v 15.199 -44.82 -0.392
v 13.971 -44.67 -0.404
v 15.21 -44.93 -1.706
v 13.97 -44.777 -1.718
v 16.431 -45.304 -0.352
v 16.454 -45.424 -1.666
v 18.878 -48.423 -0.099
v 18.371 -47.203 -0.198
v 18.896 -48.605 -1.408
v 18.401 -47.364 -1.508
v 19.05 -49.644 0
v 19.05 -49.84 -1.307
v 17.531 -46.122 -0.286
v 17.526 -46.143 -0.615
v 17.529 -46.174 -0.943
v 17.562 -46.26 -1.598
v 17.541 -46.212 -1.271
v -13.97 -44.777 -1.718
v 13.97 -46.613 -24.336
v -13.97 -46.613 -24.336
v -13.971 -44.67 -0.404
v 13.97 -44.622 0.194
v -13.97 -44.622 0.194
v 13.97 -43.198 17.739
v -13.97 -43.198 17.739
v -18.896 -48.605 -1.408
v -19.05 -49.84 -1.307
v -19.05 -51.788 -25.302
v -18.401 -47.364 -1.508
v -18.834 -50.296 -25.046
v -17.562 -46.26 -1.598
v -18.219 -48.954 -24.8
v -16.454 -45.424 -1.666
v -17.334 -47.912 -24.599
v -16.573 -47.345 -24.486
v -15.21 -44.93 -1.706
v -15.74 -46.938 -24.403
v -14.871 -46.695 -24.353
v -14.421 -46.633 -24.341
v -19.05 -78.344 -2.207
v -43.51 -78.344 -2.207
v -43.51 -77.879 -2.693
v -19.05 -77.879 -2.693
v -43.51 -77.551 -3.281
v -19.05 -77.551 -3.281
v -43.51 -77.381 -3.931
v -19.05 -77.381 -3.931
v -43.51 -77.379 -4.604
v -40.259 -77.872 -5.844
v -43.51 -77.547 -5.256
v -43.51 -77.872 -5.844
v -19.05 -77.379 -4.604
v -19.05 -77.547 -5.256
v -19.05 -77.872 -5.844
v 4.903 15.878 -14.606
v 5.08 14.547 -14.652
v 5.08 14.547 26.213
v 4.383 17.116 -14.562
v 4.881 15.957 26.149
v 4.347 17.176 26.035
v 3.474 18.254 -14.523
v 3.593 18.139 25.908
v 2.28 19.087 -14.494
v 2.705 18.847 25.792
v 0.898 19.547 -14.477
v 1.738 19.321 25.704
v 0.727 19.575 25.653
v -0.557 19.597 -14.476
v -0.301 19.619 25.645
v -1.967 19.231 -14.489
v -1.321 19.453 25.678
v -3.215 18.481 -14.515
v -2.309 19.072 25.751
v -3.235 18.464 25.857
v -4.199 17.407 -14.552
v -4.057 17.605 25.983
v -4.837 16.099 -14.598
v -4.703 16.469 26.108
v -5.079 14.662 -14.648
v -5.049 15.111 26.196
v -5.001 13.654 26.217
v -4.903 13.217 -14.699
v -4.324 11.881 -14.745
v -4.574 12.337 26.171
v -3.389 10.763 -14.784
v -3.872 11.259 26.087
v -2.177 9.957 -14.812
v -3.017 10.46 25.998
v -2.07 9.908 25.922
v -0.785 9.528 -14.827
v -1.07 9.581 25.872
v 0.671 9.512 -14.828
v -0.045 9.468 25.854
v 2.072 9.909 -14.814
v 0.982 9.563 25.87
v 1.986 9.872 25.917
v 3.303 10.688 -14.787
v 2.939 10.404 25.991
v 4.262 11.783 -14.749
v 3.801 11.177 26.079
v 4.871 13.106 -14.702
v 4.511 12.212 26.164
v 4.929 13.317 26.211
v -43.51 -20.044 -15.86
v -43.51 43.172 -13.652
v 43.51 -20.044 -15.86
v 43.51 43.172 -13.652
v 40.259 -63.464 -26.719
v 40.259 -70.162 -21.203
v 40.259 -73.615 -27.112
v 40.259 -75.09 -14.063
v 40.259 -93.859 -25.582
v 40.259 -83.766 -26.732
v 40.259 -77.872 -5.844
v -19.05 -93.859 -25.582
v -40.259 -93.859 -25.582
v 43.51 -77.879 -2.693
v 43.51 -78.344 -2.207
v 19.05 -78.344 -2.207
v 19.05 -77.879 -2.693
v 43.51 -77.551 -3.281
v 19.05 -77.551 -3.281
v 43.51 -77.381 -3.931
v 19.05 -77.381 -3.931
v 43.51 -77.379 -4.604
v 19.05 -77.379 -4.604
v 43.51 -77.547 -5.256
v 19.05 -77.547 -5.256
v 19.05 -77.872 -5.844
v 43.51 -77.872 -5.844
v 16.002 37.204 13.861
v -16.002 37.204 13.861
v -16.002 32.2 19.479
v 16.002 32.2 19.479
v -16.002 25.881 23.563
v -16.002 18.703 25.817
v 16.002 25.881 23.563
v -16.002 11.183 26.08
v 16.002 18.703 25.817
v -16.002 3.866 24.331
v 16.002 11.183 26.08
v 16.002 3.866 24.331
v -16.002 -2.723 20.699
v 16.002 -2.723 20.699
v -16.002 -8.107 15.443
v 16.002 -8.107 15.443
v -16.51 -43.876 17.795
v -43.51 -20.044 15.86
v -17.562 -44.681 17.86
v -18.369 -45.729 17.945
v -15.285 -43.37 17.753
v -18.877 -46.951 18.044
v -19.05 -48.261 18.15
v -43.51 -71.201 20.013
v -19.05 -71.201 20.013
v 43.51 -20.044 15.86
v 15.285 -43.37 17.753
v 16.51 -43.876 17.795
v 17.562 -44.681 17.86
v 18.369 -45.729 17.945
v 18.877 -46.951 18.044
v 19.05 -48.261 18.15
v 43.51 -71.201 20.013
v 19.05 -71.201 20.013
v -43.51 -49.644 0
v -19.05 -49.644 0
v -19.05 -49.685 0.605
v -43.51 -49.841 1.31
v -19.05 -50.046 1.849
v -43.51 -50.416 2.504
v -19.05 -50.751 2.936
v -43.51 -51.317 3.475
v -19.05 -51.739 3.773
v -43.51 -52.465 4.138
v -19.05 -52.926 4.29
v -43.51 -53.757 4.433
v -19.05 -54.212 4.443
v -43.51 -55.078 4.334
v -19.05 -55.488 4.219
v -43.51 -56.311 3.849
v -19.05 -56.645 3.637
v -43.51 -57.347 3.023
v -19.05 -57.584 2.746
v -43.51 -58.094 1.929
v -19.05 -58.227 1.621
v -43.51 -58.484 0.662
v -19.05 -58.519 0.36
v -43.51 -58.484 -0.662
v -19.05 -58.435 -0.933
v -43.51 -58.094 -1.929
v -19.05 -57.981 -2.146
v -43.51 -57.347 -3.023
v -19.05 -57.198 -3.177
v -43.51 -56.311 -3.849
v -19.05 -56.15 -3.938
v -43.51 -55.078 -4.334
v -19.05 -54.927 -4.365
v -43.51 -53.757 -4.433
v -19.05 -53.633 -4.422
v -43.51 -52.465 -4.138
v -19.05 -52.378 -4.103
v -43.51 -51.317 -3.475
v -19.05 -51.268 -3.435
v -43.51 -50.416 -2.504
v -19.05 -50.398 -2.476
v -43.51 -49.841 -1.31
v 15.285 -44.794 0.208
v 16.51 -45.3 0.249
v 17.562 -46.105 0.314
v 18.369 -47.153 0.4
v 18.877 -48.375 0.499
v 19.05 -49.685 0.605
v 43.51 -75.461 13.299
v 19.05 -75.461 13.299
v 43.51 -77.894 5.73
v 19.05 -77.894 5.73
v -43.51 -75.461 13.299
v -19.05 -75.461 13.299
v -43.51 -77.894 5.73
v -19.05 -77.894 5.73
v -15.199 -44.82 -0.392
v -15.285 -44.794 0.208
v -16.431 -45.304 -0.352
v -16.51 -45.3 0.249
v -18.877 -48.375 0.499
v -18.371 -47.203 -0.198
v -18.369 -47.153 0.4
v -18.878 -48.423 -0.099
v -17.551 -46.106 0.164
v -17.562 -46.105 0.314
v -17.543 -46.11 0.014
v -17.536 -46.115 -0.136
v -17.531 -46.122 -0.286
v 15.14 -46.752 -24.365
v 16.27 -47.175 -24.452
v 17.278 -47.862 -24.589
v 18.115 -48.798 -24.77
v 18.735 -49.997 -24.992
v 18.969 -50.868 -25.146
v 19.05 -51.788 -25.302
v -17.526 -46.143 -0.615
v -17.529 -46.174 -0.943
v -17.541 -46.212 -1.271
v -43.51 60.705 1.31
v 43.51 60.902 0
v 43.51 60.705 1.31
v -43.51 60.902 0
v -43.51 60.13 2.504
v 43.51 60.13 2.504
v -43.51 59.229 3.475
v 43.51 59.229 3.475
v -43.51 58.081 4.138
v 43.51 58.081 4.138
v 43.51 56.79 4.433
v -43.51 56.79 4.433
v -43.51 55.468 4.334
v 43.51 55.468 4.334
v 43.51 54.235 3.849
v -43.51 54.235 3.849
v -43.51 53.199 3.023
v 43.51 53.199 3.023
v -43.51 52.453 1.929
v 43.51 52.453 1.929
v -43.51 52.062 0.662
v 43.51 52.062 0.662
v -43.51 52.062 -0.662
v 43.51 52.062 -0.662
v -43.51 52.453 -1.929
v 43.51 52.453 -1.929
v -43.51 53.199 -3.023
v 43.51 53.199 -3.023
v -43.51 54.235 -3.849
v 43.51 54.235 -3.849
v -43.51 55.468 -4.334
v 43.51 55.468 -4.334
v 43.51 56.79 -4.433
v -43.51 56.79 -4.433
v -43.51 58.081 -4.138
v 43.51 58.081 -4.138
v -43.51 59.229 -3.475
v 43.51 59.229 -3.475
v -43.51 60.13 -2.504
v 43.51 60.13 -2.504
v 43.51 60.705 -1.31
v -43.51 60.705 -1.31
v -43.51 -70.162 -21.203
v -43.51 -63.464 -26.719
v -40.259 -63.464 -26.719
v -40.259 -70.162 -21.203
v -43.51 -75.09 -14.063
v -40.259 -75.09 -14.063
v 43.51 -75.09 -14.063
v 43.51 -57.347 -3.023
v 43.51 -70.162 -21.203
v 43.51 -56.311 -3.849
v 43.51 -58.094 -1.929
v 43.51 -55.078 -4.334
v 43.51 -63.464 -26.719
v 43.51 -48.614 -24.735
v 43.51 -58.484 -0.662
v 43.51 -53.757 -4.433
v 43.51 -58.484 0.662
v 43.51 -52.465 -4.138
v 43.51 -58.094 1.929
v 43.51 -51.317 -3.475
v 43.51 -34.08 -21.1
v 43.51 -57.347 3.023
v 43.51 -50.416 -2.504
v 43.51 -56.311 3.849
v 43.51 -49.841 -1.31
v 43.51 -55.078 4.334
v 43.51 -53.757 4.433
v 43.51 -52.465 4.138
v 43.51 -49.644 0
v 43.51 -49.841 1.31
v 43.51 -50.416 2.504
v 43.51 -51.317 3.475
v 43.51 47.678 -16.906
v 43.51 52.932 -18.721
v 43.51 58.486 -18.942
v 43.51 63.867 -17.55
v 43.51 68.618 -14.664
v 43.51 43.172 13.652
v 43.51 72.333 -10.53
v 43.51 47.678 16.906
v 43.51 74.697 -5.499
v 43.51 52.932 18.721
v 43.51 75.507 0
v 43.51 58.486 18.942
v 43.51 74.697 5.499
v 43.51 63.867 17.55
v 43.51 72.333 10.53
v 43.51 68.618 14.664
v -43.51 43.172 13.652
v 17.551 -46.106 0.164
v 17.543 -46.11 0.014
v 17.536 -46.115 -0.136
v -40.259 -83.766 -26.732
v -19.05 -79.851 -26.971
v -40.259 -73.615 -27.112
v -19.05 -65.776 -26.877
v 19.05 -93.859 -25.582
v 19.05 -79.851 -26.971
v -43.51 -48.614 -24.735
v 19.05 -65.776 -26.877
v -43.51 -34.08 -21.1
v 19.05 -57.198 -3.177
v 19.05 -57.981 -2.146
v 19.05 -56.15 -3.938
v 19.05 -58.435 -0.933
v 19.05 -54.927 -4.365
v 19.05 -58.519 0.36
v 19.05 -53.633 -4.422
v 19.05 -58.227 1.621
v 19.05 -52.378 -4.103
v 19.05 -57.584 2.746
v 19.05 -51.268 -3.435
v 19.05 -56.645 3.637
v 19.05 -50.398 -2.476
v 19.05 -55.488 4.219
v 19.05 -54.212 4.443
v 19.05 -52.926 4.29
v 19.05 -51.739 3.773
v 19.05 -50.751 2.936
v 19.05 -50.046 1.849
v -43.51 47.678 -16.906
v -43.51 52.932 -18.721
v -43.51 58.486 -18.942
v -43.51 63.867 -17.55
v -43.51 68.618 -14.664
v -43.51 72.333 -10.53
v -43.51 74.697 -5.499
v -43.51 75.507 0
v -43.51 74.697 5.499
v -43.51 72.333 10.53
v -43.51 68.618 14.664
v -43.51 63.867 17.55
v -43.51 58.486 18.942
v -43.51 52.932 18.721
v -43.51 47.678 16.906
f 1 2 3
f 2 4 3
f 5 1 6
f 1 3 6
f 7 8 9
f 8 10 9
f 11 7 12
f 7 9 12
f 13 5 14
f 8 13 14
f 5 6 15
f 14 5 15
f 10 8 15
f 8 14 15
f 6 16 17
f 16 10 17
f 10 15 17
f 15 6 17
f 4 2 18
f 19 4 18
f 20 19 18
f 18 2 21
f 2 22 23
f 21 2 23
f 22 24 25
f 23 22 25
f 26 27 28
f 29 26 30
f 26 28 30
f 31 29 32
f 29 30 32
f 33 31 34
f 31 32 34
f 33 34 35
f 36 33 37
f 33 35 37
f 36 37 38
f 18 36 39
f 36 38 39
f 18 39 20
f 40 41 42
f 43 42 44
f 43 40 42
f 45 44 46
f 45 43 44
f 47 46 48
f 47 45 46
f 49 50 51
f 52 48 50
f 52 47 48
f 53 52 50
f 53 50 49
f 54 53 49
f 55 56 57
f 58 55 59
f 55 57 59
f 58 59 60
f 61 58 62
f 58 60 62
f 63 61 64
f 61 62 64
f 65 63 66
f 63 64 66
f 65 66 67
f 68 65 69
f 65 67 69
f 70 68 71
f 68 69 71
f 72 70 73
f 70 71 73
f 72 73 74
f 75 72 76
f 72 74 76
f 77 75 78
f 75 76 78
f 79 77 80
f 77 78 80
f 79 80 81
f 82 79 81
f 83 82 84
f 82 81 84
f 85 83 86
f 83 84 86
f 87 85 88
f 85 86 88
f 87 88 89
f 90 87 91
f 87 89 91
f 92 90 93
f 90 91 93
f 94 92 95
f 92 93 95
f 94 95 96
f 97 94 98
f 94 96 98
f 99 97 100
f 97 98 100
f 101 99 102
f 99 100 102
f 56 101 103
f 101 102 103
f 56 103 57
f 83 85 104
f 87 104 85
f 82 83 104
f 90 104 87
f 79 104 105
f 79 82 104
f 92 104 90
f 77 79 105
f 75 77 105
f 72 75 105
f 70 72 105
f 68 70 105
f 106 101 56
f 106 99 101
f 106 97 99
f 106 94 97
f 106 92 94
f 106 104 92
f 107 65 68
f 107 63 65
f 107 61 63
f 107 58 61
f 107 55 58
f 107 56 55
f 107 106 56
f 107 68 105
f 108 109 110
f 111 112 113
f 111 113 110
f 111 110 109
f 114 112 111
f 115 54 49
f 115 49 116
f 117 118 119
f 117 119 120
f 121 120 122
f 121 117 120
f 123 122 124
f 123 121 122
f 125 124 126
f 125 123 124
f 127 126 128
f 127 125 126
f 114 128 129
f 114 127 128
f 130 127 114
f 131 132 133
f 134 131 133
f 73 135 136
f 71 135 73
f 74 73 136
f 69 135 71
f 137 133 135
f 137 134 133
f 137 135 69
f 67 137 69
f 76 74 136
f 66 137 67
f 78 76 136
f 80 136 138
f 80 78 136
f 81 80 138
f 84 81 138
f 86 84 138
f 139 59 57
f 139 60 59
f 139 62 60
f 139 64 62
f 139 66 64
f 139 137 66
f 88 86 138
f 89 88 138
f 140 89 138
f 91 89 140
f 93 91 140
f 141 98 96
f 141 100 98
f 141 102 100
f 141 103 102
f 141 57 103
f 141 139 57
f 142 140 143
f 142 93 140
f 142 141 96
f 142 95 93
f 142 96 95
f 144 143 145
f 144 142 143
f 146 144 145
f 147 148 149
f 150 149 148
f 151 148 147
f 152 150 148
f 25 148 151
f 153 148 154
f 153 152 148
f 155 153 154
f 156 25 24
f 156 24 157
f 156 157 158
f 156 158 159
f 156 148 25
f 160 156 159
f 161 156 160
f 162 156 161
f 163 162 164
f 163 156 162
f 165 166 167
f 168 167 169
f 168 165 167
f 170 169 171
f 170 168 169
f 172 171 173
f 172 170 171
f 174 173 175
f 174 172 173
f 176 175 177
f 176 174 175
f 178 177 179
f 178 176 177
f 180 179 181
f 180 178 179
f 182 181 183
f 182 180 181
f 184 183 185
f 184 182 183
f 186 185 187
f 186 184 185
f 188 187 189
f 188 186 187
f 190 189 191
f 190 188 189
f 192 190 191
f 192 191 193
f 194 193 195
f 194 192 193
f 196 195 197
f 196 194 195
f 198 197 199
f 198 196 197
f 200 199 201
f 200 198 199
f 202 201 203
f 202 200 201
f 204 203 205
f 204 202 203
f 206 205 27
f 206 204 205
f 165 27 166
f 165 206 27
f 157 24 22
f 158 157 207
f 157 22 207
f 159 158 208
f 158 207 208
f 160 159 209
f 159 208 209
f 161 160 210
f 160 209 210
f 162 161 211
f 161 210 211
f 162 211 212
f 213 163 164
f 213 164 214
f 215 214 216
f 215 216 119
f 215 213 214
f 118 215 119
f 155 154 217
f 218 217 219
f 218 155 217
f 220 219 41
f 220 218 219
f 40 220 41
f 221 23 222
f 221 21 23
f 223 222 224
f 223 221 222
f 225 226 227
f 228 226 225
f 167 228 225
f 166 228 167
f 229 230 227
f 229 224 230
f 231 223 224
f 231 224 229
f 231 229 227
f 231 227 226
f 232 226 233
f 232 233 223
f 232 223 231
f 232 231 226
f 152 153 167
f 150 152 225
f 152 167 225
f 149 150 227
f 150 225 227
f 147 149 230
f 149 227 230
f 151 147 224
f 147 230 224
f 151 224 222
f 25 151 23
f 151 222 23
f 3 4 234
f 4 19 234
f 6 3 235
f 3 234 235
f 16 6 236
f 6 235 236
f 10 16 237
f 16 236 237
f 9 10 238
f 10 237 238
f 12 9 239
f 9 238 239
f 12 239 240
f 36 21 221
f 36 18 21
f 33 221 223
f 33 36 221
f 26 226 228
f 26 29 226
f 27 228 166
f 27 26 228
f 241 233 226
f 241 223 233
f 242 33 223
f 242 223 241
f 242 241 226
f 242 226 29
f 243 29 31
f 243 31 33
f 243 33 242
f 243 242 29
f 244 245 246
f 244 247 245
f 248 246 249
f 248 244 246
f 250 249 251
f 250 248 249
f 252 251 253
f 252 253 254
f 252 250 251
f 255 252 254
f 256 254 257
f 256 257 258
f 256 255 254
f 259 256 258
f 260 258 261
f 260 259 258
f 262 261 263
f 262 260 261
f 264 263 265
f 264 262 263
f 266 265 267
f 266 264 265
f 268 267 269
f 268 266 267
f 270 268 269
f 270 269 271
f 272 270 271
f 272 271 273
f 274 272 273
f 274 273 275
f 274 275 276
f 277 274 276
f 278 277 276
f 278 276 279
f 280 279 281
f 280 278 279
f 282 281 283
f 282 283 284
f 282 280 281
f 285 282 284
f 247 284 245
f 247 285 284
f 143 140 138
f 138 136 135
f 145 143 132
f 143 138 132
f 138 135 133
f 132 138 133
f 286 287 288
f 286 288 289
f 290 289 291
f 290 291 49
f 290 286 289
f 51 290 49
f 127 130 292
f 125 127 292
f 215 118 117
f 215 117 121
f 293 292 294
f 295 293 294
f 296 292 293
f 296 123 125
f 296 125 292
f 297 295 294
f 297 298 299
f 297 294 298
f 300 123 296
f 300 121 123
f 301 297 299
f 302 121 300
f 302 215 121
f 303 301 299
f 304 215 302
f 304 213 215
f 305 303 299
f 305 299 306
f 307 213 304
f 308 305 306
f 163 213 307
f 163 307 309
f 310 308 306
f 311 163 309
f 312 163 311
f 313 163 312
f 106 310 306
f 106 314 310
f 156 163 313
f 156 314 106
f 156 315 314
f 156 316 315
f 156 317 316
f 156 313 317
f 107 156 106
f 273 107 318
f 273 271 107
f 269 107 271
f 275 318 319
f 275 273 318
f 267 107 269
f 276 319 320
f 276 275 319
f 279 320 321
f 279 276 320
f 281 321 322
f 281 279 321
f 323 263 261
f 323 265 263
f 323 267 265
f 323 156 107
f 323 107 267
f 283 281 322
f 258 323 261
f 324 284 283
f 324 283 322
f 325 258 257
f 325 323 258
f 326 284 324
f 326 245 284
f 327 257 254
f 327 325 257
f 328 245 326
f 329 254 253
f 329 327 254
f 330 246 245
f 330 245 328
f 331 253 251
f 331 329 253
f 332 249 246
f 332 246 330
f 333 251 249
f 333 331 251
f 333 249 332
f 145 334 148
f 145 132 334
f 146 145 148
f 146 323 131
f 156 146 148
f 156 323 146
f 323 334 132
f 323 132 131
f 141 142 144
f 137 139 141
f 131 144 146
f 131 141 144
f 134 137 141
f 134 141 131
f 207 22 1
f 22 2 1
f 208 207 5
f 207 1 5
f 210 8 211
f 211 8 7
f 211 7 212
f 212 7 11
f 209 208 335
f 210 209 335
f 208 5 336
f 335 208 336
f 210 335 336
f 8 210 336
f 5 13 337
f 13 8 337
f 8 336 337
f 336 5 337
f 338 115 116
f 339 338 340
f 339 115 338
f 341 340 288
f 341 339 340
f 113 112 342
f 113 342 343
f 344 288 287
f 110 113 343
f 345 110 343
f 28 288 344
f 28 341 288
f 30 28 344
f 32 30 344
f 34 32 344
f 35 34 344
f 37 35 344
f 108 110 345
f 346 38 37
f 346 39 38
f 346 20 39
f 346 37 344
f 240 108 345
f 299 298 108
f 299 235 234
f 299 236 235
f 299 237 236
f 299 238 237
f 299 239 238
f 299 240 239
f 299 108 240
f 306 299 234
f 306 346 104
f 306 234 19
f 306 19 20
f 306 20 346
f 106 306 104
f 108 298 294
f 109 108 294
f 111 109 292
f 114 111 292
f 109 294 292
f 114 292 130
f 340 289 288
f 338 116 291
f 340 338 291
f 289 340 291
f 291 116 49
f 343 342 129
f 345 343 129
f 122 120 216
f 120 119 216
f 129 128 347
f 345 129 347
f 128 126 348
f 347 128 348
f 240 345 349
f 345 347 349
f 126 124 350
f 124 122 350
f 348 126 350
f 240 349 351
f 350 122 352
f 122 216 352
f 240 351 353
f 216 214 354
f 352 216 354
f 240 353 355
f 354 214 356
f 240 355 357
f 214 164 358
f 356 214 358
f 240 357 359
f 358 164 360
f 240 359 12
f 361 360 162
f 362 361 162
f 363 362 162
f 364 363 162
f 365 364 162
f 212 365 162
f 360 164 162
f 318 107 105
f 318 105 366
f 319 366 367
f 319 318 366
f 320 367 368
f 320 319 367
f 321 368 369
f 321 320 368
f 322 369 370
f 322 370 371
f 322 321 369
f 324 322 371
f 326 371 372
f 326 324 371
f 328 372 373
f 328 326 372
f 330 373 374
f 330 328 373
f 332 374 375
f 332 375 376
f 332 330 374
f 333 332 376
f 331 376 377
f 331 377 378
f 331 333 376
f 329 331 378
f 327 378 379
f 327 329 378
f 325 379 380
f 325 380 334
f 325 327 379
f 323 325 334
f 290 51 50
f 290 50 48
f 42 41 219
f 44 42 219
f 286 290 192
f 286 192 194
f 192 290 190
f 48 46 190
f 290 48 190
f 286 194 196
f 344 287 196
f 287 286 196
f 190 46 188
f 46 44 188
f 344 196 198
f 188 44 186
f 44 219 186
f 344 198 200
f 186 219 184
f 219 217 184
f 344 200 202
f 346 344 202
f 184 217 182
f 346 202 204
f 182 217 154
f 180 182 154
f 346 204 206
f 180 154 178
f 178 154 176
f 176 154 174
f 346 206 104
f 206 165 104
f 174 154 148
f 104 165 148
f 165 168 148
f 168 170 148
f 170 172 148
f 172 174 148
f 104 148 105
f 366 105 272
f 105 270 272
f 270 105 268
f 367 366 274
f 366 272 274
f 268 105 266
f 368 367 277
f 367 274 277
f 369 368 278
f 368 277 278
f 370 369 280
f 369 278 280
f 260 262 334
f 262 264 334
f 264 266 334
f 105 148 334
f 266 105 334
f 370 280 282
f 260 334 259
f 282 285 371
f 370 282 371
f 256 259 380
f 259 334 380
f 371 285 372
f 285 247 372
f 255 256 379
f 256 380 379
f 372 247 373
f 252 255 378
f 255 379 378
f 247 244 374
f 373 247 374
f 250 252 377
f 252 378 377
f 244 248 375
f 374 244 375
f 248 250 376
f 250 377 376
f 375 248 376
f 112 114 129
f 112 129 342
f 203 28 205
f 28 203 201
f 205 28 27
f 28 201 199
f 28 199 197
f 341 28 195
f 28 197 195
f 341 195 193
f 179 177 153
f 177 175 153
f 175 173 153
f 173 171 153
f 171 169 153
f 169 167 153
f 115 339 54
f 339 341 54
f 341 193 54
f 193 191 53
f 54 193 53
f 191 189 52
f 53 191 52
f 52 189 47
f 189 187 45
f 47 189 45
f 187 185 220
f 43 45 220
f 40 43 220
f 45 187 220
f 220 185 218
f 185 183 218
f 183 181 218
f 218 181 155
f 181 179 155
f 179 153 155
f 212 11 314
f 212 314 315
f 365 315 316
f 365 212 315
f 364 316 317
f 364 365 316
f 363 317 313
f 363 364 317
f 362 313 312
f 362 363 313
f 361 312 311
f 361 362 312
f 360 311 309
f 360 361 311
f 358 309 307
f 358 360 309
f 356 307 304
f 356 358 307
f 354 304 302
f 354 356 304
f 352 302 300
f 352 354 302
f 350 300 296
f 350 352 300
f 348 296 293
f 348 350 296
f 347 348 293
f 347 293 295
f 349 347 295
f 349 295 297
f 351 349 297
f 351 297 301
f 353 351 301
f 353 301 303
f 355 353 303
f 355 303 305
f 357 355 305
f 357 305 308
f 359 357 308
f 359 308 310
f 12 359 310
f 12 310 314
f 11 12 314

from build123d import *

# Parameters (mm, degrees)
F0_R      = 4.445
F1_DEPTH  = 43.5102
F4_DEPTH  = 16.002
F5_R      = 5.08
F6_DEPTH  = 76.2
F8_DEPTH  = 3.2512
F10_DEPTH = 48.8043176288
F11_R     = 5.08


# Not quite as in the source:
# - a pattern or mirror of a feature is missing from the dataset's text; its kind, count and spacing are read off the source's solid


with BuildPart() as f1:
    # F0 (on Right) → F1 (new body, symmetric)
    with BuildSketch(Plane.YZ):
        with BuildLine():
            Line((-20.0435682294, -15.8600244388), (43.1716607283, -13.6525))
            ThreePointArc((43.1716607283, -13.6525), (75.5074329584, 0), (43.1716607283, 13.6525))
            Line((43.1716607283, 13.6525), (-20.0435682294, 15.8600244388))
            ThreePointArc((-20.0435682294, 15.8600244388), (-15.7347770092, 0), (-20.0435682294, -15.8600244388))
        make_face()
        with Locations((56.4574329584, 0)):
            Circle(F0_R, mode=Mode.SUBTRACT)
        with BuildLine():
            ThreePointArc((-93.8586293632, -25.5824005626), (-56.2599595636, -25.9685392928), (-20.0435682294, -15.8600244388))
            ThreePointArc((-20.0435682294, -15.8600244388), (-15.7347770092, 0), (-20.0435682294, 15.8600244388))
            Line((-20.0435682294, 15.8600244388), (-71.2014077133, 20.0125123513))
            ThreePointArc((-71.2014077133, 20.0125123513), (-76.9181304267, 9.5922039668), (-78.3441527071, -2.2073810202))
            ThreePointArc((-78.3441527071, -2.2073810202), (-77.3808721828, -3.9314055649), (-77.8723212002, -5.8441647924))
            Line((-77.8723212002, -5.8441647924), (-93.8586293632, -25.5824005626))
        make_face()
        with Locations((-54.0887770092, 0)):
            Circle(F0_R, mode=Mode.SUBTRACT)
    extrude(amount=F1_DEPTH, both=True)

    # F3 (on Right) → F4 (join, symmetric)
    with BuildSketch(Plane.YZ):
        with BuildLine():
            ThreePointArc((37.2042329584, 13.8608871696), (14.9518760887, 26.202001098), (-8.1071477478, 15.4431954506))
            Line((-8.1071477478, 15.4431954506), (37.2042329584, 13.8608871696))
        make_face()
    extrude(amount=F4_DEPTH, both=True)

    # F5 (on Top) → F6 (cut, symmetric)
    with BuildSketch(Plane.XY):
        with Locations((0, 14.5474329584)):
            Circle(F5_R)
    extrude(amount=F6_DEPTH, both=True, mode=Mode.SUBTRACT)

    # F7 (on face) → F8 (cut)
    with BuildSketch(Plane.YZ.offset(43.5102)):
        with BuildLine():
            ThreePointArc((-63.4642960228, -26.7193360516), (-72.8742694492, -17.8043026874), (-77.8723212002, -5.8441647924))
            Line((-77.8723212002, -5.8441647924), (-93.8586293632, -25.5824005626))
            ThreePointArc((-93.8586293632, -25.5824005626), (-78.69393168, -27.0188799259), (-63.4642960228, -26.7193360516))
        make_face()
    f8 = extrude(amount=-F8_DEPTH, mode=Mode.SUBTRACT)

    # F8_copies: F8 across plane
    add(f8.mirror(Plane(origin=(0, 0, 0), x_dir=(0, 0, -1), z_dir=(-1, 0, 0))), mode=Mode.SUBTRACT)

    # F9 (on face) → F10 (cut, through all)
    with BuildSketch(Plane(origin=(0, 1.1477392706, 14.1399234898), x_dir=(1, 0, 0), z_dir=(0, 0.0809040348, 0.9967218956))):
        Polygon((19.05, -91.4812315527), (19.05, -44.4912315527), (0, -44.4912315527), (-19.05, -44.4912315527), (-19.05, -91.4812315527), align=None)
    extrude(amount=-F10_DEPTH, mode=Mode.SUBTRACT)

    # F11
    f11_edges = [f1.edges().sort_by_distance(p)[0] for p in [
        (19.05, -44.905298, -3.298502),
        (-19.05, -44.905298, -3.298502),
    ]]
    fillet(f11_edges, radius=F11_R)


solid = f1.part
